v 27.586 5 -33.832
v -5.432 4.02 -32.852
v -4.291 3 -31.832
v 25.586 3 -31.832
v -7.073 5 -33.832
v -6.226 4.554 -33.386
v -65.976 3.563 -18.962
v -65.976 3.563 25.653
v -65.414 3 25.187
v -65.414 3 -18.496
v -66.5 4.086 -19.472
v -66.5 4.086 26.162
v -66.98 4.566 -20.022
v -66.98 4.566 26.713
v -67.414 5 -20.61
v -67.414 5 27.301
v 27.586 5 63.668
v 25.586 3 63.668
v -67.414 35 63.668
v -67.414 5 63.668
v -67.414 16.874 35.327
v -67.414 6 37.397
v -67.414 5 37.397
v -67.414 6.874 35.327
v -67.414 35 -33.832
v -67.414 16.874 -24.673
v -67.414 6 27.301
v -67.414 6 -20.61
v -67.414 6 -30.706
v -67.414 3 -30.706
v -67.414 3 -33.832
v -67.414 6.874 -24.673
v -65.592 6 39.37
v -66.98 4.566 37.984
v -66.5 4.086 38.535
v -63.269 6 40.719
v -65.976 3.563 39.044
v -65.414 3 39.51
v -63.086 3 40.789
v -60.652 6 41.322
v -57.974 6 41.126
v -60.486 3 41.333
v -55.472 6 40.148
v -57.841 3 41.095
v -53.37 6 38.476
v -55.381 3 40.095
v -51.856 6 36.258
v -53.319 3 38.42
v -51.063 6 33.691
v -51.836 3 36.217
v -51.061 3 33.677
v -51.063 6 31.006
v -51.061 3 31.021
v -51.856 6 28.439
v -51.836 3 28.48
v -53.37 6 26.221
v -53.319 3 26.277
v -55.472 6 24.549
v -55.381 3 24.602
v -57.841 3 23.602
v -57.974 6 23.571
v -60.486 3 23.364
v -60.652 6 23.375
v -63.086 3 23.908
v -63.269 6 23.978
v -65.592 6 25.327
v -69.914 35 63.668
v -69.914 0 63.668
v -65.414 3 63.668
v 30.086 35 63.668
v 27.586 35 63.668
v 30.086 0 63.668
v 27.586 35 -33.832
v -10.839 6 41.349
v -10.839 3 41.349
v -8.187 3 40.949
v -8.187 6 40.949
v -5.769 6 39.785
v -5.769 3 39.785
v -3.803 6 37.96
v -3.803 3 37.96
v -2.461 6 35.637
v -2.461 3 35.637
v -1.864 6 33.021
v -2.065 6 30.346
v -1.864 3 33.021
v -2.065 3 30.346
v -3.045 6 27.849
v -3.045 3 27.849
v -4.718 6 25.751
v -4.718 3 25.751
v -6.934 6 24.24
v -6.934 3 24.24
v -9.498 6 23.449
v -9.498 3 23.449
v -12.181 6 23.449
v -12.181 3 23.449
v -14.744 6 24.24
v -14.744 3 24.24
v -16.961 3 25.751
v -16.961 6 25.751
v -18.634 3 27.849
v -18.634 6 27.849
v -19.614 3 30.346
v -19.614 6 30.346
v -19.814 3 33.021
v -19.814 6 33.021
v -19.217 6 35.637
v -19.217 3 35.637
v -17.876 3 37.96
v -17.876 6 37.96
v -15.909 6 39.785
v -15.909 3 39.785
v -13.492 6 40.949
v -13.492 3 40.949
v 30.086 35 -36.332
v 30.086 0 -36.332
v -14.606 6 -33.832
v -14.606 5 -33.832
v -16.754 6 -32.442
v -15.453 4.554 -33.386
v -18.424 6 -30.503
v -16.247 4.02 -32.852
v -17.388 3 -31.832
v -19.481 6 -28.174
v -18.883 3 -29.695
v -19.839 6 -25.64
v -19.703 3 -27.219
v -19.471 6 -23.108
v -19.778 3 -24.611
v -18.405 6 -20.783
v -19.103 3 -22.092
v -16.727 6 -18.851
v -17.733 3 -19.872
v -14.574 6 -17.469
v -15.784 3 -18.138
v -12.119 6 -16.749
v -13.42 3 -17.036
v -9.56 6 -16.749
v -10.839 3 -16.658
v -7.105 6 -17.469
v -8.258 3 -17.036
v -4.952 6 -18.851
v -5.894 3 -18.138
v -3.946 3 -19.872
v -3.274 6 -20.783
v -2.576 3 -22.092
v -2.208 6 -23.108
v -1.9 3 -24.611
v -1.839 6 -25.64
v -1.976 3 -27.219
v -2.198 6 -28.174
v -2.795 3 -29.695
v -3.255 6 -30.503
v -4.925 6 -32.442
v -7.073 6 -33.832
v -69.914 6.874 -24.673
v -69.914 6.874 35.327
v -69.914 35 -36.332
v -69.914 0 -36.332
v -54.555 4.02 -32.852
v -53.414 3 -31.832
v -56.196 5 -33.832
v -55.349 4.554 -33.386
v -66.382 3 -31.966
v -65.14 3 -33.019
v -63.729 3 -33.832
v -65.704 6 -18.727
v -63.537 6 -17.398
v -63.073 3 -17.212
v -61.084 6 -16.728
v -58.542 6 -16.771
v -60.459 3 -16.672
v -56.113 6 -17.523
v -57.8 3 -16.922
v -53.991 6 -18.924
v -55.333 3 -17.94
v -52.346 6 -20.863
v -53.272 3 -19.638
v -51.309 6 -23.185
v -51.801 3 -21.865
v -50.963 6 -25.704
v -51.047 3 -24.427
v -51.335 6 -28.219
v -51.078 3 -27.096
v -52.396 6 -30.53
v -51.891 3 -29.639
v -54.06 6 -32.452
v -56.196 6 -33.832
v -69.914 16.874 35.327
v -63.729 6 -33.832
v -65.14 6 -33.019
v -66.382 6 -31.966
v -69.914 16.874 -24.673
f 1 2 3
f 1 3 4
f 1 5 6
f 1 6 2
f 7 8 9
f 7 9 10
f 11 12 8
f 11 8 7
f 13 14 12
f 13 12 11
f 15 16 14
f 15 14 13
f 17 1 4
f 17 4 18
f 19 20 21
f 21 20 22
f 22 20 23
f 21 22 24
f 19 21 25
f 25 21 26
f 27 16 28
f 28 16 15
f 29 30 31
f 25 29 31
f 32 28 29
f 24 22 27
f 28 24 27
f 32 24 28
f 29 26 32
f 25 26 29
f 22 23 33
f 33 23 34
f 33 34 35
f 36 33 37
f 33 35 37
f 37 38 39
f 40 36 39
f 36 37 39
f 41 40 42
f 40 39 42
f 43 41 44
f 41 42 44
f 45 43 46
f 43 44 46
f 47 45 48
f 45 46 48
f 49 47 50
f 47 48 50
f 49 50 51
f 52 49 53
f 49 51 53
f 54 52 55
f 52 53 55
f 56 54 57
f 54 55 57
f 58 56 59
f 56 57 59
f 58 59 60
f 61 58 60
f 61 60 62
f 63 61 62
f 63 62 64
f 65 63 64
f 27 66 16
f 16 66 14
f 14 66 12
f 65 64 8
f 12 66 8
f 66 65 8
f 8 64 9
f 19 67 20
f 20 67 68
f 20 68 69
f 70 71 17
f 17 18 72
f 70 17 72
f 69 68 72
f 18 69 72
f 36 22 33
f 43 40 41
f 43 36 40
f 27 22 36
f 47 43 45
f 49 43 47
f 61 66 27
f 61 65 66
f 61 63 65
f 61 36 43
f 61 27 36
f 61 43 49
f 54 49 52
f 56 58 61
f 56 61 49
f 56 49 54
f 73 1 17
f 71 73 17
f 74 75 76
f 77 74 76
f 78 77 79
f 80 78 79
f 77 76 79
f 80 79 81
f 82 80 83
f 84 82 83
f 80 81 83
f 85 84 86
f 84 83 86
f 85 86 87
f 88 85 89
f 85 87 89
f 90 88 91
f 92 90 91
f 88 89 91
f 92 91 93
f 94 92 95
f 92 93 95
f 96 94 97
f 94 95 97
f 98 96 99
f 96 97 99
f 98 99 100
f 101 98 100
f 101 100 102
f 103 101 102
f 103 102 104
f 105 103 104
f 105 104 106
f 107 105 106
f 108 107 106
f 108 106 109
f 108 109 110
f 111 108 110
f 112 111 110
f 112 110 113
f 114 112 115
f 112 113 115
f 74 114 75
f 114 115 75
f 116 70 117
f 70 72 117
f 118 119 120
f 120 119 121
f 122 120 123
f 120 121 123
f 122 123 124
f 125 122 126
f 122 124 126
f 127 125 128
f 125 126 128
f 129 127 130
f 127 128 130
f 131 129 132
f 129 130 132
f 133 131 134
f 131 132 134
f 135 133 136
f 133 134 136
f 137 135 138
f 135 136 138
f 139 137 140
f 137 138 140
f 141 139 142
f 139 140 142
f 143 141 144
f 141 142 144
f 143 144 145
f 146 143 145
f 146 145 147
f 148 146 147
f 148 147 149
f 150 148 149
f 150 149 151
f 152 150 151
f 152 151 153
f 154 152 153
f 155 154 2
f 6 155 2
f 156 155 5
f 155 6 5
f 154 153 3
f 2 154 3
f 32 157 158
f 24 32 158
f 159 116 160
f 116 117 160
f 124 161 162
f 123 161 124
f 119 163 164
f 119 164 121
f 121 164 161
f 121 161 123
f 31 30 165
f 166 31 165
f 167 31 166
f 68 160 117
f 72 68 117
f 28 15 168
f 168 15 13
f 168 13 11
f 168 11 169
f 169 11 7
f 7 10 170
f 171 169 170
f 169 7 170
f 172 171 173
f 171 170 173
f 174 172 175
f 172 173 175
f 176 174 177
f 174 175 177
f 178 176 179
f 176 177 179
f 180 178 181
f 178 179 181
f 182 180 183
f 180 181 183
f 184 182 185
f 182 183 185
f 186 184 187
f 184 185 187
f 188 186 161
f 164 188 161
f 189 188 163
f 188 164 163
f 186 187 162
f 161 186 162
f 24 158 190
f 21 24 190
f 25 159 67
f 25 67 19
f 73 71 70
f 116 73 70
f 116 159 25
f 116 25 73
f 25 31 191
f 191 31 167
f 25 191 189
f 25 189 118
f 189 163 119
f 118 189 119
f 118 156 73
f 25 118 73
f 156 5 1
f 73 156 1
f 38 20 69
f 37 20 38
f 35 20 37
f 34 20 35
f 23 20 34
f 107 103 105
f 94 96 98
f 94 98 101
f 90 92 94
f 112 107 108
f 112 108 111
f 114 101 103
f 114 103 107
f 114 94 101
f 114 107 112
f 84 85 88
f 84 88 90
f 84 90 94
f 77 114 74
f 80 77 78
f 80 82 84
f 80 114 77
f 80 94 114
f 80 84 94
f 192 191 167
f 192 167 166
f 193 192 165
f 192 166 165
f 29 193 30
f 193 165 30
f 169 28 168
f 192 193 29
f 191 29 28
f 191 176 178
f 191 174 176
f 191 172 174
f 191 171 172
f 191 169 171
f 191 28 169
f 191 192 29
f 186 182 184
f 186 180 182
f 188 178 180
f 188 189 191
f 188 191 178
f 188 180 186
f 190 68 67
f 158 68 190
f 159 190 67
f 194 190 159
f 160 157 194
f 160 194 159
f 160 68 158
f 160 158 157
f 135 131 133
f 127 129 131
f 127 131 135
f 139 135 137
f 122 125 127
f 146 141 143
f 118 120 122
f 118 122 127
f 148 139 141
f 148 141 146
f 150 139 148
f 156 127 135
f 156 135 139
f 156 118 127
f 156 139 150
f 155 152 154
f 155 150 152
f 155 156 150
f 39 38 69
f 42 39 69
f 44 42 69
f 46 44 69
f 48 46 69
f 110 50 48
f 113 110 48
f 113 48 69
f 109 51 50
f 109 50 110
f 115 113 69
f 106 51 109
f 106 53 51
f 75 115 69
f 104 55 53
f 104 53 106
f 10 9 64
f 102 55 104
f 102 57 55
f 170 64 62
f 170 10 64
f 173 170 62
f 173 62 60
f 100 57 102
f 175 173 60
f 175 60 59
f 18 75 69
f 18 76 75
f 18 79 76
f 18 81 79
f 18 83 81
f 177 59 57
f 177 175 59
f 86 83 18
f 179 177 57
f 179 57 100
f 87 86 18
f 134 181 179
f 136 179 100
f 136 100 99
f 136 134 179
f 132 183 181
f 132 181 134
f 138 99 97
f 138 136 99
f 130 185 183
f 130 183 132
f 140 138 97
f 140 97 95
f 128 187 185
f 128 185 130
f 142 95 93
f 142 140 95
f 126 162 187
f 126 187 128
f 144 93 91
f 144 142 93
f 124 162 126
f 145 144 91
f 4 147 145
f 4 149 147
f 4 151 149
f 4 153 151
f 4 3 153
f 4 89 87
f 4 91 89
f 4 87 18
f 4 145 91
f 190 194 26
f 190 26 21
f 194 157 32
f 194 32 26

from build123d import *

# Parameters (mm, degrees)
SKETCH_1_W          = 100
SKETCH_1_H          = 100
EXTRUDE_1_DEPTH     = 3
EXTRUDE_2_DEPTH     = 32
SKETCH_3_R          = 9
EXTRUDE_3_DEPTH     = 3
SKETCH_4_W          = 60
SKETCH_4_H          = 10
CUT_EXTRUDE_1_DEPTH = 2.5
CHAMFER_1_SIZE      = 2


with BuildPart() as part:
    # Эскиз1 → Бобышка-Вытянуть1 (new body)
    with BuildSketch(Plane(origin=(0, 0, 0), x_dir=(1, 0, 0), z_dir=(0, 1, 0))):
        with Locations((-19.913614773, -13.668080108)):
            Rectangle(SKETCH_1_W, SKETCH_1_H)
    extrude(amount=EXTRUDE_1_DEPTH)

    # Эскиз2 → Бобышка-Вытянуть2 (add)
    with BuildSketch(Plane(origin=(0, 3, 0), x_dir=(1, 0, 0), z_dir=(0, 1, 0))):
        Polygon((27.586385227, -61.041825342), (27.586385227, -63.668080108), (30.086385227, -63.668080108), (30.086385227, 36.331919892), (-69.913614773, 36.331919892), (-69.913614773, -63.668080108), (-67.413614773, -63.668080108), (-67.413614773, -61.041825342), (-67.413614773, 33.831919892), (27.586385227, 33.831919892), align=None)
    extrude(amount=EXTRUDE_2_DEPTH)

    # Эскиз3 → Бобышка-Вытянуть3 (add)
    with BuildSketch(Plane(origin=(0, 3, 0), x_dir=(1, 0, 0), z_dir=(0, 1, 0))):
        with Locations((-10.839314865, 25.657938065)):
            Circle(SKETCH_3_R)
        with Locations((-59.962592759, 25.657938065)):
            Circle(SKETCH_3_R)
        with Locations((-59.962592759, -32.348529185)):
            Circle(SKETCH_3_R)
        with Locations(Location((-10.839314865, -32.348529185, 0), (0, 0, 270))):
            Circle(SKETCH_3_R)
    extrude(amount=EXTRUDE_3_DEPTH)

    # Эскиз4 → Вырез-Вытянуть1 (cut)
    with BuildSketch(Plane.ZY.offset(69.913614773)):
        with Locations((5.326629647, 11.873940314)):
            Rectangle(SKETCH_4_W, SKETCH_4_H)
    extrude(amount=-CUT_EXTRUDE_1_DEPTH, mode=Mode.SUBTRACT)

    # Фаска1
    chamfer_1_edges = [part.edges().sort_by_distance(p)[0] for p in [
        (-67.413614773, 3, 50.53230301),
        (27.586385227, 3, 14.918080108),
        (10.256751916, 3, -33.831919892),
        (-35.400953812, 3, -33.831919892),
        (-67.413614773, 3, 3.34529556),
    ]]
    chamfer(chamfer_1_edges, length=CHAMFER_1_SIZE)


solid = part.part
